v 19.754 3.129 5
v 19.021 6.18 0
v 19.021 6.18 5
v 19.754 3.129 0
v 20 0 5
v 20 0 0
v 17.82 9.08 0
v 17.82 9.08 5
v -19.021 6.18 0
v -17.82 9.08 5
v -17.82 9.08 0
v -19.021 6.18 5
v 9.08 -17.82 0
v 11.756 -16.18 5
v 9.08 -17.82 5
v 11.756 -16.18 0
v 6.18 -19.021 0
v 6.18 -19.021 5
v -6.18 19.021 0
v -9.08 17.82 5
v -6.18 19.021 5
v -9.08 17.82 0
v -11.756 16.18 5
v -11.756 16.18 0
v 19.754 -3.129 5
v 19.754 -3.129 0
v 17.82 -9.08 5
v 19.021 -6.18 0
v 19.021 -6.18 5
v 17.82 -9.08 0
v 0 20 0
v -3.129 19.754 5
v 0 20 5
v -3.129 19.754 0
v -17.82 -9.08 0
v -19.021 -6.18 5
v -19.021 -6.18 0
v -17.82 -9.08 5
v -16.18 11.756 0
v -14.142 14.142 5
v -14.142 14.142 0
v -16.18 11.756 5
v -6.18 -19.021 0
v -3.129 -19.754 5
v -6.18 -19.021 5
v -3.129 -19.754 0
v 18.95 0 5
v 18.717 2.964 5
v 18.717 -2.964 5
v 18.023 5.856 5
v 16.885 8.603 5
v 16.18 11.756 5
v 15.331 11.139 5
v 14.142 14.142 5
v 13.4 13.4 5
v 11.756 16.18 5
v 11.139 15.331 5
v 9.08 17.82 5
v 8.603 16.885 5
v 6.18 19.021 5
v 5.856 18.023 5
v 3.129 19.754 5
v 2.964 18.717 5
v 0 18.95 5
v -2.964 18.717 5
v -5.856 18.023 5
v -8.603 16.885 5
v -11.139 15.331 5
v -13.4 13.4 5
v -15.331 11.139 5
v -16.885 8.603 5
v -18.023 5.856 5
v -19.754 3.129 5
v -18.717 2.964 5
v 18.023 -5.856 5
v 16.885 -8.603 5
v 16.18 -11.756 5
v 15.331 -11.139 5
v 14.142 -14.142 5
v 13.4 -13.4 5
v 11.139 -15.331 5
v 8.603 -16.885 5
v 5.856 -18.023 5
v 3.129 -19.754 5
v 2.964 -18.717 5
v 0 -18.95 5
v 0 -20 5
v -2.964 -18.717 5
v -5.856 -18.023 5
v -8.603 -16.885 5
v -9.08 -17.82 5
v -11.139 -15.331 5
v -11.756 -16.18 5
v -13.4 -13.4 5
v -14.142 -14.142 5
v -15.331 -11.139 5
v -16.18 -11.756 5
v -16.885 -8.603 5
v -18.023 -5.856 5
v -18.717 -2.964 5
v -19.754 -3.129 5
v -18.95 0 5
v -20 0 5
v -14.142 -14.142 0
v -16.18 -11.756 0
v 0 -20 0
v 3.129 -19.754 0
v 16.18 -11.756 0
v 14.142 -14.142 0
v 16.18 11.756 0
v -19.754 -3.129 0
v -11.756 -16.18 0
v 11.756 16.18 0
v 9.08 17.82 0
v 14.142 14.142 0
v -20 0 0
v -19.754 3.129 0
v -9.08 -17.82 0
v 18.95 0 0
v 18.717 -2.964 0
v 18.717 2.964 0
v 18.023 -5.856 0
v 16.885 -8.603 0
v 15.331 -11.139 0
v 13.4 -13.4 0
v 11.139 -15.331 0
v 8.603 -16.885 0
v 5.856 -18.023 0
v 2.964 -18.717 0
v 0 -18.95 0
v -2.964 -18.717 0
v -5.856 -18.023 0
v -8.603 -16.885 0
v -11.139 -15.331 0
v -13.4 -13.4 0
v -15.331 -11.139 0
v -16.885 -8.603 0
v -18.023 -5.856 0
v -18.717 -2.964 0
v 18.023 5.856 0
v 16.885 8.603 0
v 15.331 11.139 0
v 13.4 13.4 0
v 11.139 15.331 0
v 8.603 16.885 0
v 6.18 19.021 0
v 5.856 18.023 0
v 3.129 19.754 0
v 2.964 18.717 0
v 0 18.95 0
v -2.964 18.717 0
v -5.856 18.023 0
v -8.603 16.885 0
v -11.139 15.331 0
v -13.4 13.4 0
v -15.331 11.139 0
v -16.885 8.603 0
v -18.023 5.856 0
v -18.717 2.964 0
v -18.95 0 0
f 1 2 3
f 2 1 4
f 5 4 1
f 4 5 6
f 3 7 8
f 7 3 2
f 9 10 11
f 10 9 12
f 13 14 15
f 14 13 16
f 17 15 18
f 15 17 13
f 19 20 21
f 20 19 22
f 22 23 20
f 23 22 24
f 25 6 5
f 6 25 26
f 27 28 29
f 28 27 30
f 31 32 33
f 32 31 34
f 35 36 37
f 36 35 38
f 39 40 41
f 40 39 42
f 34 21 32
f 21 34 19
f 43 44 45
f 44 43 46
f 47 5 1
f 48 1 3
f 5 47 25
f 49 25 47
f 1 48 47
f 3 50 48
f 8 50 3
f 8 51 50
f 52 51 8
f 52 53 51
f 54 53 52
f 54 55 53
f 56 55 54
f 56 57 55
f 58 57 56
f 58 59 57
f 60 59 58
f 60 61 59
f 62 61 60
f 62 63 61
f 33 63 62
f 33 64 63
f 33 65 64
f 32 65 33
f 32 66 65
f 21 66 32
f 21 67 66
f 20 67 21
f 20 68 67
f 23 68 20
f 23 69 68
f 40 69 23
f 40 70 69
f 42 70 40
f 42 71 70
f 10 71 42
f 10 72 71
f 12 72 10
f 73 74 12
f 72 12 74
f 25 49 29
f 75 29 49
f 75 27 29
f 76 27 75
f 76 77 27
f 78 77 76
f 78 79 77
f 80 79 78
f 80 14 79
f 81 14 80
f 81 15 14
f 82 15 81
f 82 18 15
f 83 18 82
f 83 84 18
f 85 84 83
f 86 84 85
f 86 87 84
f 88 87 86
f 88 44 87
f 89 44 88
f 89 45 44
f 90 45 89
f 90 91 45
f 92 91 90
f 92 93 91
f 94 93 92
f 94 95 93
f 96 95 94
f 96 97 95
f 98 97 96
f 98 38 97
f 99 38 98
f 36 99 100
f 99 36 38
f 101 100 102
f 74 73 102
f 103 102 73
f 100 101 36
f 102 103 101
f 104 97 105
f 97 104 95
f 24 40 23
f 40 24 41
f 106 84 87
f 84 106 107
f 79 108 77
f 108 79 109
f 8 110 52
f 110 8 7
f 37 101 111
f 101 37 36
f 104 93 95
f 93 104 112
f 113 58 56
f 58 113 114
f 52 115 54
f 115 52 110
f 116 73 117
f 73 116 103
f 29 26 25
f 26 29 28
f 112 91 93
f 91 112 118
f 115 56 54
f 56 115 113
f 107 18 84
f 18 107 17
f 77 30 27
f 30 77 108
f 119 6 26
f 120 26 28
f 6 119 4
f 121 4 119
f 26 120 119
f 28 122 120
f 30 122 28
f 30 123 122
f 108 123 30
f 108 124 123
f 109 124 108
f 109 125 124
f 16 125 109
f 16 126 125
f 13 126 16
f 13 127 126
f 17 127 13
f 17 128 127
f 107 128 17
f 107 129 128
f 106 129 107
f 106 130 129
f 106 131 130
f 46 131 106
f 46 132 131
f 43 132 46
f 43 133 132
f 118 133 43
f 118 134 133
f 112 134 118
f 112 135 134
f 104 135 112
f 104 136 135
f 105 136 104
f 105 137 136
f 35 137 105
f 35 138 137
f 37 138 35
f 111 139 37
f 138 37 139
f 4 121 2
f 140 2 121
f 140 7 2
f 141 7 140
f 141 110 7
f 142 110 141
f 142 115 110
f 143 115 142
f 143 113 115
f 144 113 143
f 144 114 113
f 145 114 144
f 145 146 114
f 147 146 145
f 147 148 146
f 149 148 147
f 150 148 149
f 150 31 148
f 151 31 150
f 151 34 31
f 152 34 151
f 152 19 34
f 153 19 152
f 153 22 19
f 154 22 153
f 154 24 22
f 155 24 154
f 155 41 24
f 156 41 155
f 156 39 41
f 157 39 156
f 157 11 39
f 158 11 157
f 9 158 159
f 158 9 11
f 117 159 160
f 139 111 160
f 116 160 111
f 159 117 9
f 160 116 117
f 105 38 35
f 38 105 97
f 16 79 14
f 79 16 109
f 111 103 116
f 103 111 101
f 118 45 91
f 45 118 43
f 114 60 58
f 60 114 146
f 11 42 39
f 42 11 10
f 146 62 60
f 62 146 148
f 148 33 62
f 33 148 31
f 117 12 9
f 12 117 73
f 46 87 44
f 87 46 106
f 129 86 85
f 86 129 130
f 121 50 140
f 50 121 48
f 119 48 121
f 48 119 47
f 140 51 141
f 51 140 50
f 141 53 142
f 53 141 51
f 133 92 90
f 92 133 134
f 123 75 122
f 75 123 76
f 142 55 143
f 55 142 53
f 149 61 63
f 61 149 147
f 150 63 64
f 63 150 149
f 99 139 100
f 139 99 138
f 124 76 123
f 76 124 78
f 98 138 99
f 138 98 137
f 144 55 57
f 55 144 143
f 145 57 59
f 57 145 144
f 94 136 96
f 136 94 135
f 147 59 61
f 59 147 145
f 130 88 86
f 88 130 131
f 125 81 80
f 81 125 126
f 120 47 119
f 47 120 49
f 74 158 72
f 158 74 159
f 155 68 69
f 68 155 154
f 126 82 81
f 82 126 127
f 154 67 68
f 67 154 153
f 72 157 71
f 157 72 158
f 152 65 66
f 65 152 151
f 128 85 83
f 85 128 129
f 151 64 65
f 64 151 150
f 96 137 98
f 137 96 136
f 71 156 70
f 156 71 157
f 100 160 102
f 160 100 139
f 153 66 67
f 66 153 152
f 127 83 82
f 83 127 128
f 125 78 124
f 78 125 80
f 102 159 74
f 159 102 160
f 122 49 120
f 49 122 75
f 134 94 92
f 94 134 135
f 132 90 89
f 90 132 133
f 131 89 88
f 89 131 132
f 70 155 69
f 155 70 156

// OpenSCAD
thickness = 1.05;
$fn=40;

difference() {
	cylinder(r=20, h=5);
	cylinder(r=20 - thickness, h=5);
}
